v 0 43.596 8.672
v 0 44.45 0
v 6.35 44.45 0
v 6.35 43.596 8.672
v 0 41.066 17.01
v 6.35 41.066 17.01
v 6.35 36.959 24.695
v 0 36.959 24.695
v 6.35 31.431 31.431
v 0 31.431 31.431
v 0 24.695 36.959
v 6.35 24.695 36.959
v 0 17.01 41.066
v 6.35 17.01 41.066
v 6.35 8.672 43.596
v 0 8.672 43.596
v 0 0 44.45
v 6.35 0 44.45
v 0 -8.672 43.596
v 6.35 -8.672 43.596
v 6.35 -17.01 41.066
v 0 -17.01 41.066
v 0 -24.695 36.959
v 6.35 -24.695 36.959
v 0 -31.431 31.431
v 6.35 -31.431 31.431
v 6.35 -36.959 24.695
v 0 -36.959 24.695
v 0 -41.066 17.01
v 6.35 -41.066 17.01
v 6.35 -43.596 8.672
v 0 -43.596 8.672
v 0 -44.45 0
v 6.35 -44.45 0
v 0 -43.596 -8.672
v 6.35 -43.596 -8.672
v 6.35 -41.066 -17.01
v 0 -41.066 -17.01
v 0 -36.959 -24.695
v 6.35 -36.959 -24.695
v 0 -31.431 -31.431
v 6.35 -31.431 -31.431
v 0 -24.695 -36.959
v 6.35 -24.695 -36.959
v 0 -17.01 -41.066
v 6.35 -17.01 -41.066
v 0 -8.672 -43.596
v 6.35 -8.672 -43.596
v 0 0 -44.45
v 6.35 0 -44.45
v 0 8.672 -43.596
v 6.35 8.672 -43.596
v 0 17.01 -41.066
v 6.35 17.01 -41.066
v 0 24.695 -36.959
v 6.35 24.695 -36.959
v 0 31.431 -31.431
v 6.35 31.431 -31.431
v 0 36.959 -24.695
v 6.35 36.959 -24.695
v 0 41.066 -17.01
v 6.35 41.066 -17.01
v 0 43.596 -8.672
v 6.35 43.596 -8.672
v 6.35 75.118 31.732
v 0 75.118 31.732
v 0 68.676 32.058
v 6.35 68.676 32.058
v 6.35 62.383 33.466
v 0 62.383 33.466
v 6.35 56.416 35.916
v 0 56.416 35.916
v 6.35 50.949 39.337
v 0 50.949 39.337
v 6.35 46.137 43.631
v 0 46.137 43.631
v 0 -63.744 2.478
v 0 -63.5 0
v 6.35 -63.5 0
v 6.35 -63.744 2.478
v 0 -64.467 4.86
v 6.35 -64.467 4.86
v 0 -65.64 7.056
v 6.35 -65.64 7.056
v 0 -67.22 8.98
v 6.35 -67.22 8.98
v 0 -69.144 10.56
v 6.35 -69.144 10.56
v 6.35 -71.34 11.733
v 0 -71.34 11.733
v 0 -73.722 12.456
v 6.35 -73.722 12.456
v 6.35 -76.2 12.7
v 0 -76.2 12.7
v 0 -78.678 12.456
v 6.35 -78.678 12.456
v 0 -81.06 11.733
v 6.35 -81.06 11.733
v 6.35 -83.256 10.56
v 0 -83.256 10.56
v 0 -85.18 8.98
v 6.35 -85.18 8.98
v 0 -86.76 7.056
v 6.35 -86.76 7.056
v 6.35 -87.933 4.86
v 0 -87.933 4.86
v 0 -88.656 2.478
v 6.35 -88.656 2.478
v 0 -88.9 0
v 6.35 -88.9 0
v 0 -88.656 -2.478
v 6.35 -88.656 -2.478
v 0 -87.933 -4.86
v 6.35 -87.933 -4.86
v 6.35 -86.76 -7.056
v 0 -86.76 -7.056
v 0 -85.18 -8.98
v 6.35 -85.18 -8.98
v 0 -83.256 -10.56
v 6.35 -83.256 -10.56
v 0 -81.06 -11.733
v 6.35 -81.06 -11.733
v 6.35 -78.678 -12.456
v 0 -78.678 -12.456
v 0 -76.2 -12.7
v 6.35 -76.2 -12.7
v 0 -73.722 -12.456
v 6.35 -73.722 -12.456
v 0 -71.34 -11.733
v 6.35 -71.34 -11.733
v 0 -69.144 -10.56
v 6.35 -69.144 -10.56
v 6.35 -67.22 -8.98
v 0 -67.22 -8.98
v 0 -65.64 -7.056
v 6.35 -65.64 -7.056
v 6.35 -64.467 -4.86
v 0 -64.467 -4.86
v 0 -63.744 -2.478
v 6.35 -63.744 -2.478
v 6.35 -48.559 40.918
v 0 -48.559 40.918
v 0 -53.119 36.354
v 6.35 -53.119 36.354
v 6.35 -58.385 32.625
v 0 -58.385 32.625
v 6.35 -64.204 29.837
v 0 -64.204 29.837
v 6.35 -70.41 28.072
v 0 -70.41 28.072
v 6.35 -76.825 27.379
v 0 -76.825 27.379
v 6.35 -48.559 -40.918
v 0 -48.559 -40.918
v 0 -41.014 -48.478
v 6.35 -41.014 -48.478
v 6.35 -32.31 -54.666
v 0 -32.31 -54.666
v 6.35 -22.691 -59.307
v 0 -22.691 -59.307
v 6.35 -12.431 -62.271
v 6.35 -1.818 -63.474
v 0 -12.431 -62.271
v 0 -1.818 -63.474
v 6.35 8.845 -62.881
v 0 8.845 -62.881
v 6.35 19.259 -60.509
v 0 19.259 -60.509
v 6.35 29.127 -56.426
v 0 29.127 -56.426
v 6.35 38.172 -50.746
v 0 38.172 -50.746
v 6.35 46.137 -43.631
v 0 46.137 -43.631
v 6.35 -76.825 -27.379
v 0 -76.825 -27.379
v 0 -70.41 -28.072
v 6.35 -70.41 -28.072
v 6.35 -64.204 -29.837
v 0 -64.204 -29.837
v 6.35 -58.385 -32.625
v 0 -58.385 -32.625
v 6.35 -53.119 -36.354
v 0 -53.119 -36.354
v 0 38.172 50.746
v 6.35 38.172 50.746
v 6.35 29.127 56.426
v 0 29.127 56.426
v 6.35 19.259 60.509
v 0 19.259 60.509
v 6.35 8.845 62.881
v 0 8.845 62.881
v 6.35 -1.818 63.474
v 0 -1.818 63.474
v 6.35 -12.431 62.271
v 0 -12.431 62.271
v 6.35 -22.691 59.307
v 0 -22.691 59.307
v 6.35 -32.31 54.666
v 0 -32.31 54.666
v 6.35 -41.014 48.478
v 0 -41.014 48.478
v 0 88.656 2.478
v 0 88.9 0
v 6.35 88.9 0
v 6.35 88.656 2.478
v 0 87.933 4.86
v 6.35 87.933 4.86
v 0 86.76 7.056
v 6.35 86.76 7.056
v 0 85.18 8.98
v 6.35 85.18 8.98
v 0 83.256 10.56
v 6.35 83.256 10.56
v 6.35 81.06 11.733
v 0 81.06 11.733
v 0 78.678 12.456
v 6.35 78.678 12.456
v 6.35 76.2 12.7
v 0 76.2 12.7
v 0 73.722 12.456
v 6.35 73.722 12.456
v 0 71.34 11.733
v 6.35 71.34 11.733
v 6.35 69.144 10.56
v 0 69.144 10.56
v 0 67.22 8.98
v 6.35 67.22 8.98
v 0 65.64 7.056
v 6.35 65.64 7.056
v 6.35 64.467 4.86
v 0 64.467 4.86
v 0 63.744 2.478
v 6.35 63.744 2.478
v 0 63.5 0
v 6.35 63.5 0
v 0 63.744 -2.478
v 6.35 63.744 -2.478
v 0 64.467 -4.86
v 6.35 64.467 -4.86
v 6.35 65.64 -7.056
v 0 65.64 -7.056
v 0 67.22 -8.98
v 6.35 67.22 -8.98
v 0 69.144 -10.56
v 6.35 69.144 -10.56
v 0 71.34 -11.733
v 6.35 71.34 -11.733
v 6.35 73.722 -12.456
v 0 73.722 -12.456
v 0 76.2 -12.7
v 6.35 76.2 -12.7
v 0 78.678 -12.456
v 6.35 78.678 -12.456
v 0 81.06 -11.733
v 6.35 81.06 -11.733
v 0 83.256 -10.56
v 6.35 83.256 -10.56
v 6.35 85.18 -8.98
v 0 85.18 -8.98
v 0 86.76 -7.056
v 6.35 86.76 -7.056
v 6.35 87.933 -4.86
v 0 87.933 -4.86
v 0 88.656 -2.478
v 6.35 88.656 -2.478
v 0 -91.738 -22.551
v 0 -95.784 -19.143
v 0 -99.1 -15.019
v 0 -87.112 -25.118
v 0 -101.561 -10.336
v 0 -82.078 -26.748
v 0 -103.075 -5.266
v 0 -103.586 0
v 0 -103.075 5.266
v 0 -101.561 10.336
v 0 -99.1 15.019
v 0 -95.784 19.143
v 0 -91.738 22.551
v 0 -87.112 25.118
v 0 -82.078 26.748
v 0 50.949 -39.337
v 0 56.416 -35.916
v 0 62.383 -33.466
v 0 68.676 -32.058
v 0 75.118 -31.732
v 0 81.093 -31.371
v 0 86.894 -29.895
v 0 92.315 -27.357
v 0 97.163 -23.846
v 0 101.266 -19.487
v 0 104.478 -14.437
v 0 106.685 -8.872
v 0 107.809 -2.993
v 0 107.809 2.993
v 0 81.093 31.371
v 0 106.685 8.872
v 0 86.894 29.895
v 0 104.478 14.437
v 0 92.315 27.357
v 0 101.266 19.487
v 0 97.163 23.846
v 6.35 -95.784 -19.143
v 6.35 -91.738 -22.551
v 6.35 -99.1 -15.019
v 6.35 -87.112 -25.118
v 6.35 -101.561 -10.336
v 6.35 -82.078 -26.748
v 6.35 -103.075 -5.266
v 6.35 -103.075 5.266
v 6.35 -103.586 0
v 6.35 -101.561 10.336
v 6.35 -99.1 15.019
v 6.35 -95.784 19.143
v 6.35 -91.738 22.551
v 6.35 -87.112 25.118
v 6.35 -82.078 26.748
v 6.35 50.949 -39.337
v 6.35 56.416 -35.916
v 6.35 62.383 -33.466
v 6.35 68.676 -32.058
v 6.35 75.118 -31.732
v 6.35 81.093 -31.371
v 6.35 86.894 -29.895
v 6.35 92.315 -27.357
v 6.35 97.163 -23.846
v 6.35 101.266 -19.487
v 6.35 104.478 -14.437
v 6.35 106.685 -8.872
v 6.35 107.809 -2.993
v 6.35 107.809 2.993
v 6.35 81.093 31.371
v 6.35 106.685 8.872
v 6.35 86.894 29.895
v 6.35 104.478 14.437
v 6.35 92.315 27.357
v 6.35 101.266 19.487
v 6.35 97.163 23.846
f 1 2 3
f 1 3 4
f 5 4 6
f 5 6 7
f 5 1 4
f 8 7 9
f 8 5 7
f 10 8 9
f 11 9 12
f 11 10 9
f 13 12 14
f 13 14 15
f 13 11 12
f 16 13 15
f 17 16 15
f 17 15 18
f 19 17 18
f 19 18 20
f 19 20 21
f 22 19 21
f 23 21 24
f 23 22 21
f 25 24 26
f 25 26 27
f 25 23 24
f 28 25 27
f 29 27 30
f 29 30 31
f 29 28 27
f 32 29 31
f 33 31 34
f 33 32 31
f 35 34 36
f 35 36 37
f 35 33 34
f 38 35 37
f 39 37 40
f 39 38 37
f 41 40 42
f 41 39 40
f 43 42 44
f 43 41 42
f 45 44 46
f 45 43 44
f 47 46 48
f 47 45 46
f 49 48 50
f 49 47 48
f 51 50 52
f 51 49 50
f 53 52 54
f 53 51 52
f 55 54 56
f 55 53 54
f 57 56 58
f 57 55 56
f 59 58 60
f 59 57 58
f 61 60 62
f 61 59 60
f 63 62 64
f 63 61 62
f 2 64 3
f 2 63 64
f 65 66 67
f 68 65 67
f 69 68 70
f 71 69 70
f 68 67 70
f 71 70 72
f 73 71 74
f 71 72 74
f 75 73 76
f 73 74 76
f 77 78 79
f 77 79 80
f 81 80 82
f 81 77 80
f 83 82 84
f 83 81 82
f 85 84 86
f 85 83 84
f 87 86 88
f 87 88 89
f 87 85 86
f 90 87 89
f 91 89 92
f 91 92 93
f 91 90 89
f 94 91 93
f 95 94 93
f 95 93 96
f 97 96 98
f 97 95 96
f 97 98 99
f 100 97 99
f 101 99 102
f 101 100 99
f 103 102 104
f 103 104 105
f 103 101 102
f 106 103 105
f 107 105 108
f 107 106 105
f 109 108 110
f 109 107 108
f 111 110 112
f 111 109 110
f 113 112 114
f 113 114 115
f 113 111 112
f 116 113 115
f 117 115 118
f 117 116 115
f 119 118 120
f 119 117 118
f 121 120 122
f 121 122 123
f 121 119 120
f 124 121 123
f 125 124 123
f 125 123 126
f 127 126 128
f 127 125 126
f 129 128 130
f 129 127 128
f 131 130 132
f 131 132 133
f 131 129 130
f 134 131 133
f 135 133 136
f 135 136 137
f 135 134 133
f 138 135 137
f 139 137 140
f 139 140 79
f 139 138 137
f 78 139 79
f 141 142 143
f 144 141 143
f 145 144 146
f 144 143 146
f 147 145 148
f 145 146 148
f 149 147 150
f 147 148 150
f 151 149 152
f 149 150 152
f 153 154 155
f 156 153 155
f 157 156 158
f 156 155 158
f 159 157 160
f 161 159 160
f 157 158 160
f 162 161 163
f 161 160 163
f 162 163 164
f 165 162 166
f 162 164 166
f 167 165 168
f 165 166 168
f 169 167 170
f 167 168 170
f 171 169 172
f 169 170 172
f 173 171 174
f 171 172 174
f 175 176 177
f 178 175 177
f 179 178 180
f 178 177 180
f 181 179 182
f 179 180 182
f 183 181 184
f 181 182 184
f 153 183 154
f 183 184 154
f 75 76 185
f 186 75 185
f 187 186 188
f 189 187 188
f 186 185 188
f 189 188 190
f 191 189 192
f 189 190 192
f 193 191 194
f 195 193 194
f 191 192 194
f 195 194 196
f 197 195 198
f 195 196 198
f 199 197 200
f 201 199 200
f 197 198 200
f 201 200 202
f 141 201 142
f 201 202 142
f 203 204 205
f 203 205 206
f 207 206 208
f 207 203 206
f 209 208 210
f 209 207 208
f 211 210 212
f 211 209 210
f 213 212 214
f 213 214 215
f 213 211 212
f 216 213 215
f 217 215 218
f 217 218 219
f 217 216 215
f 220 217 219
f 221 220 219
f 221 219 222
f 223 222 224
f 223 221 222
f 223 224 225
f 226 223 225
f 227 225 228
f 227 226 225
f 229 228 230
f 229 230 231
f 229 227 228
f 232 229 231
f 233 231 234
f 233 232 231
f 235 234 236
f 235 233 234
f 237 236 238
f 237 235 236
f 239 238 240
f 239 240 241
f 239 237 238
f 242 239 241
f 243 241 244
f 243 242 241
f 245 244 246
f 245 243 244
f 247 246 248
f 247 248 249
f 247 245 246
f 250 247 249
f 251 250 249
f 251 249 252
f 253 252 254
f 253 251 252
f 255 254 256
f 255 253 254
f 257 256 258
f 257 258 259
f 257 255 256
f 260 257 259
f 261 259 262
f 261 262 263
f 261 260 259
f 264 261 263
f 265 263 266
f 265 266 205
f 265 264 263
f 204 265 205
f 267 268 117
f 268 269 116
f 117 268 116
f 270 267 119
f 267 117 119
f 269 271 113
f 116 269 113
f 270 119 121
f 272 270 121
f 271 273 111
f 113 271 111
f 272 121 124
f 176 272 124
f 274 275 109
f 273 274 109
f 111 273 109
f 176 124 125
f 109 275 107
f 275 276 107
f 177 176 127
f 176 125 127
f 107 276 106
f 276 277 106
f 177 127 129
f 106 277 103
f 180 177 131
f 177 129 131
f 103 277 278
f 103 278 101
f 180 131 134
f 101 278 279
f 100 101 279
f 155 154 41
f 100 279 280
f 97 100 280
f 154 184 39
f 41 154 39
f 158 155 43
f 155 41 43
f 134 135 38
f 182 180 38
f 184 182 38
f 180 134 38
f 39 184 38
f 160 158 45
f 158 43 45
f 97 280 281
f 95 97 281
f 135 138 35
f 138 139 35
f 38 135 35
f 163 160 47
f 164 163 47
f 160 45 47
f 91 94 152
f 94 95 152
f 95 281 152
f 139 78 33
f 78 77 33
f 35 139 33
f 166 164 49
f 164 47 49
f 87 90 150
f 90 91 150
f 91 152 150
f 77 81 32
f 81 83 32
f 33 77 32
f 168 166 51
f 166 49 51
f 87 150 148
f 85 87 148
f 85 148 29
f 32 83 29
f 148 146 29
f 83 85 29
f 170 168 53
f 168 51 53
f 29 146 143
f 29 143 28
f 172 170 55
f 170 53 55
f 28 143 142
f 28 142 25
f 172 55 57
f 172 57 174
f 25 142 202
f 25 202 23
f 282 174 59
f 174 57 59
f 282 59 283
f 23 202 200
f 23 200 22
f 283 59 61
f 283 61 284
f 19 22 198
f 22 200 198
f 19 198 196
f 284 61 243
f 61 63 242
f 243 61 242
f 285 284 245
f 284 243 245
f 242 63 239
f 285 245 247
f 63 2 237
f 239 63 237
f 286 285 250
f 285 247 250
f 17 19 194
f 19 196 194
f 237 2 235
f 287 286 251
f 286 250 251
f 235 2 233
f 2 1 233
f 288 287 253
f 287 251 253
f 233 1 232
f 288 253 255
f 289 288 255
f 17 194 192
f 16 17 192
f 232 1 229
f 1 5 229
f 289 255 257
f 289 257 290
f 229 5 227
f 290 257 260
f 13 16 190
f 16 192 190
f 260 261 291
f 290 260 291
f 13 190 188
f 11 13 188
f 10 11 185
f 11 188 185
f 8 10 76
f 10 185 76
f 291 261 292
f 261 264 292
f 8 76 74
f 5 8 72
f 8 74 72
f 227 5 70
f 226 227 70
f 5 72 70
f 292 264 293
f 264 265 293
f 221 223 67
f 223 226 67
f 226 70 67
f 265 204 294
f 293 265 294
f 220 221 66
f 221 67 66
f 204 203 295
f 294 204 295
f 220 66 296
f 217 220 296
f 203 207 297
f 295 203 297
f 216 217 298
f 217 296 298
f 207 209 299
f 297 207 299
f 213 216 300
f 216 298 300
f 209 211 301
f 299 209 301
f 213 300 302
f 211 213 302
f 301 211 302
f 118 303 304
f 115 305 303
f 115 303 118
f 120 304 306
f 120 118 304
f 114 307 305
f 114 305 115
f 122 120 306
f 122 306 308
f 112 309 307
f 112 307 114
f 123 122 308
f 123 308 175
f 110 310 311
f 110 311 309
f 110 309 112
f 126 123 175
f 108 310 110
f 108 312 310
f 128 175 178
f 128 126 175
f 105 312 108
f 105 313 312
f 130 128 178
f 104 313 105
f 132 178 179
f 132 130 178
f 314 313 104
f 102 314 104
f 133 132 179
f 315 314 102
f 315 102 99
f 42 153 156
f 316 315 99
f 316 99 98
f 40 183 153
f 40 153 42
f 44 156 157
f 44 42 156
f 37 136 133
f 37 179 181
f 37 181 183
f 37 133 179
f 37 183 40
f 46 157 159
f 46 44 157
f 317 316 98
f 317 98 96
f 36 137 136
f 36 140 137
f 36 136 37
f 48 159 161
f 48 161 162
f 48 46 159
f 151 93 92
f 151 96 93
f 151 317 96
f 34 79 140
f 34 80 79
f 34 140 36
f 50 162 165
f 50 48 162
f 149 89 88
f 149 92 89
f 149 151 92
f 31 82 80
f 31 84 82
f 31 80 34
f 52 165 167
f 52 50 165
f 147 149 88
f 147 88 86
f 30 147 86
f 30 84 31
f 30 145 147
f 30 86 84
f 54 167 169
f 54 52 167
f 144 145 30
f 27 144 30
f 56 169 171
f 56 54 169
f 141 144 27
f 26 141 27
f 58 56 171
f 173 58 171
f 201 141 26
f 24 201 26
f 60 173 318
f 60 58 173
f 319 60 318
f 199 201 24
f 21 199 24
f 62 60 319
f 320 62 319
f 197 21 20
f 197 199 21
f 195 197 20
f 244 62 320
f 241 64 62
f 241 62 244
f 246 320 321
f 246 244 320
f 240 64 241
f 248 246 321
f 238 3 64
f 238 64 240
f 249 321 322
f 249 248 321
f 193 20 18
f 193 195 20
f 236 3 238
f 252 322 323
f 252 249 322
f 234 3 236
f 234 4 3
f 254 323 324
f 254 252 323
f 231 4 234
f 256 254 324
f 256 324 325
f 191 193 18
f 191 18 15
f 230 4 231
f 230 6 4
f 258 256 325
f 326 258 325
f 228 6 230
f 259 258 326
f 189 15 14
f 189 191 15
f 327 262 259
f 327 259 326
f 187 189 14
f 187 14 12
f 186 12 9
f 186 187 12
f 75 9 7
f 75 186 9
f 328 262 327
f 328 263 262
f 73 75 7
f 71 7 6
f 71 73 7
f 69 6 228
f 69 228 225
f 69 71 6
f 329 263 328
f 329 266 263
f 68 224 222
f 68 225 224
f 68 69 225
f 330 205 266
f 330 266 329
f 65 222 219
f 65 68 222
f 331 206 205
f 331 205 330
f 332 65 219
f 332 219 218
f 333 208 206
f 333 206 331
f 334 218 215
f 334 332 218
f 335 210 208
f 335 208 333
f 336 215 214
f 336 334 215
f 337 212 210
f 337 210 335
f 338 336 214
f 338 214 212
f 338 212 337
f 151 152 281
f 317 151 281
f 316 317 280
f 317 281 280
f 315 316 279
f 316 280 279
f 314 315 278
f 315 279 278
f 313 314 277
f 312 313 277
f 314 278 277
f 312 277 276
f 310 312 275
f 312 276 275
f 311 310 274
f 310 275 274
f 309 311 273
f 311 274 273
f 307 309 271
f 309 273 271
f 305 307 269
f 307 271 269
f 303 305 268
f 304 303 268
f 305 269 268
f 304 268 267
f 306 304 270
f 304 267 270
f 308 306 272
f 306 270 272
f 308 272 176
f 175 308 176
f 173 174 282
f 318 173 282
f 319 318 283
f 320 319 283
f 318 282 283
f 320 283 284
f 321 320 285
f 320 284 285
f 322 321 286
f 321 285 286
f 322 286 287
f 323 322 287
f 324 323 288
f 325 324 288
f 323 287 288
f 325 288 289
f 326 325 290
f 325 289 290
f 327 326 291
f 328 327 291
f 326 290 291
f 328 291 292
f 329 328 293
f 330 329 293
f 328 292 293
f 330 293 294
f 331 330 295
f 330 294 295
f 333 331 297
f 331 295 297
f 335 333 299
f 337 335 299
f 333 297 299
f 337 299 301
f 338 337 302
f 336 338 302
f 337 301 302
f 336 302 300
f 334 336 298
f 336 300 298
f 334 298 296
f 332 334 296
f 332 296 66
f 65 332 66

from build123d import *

# Parameters (mm, degrees)
F0_R     = 12.7
F0_R_2   = 44.45
F1_DEPTH = 6.35


with BuildPart() as f1:
    # F0 (on Right) → F1 (new body)
    with BuildSketch(Plane.YZ):
        with BuildLine():
            ThreePointArc((-76.824834, -27.378873), (-61.23519, -31.10744), (-48.558824, -40.918097))
            ThreePointArc((-48.558824, -40.918097), (-1.818361, -63.47396), (46.136719, -43.630874))
            ThreePointArc((46.136719, -43.630874), (59.347524, -34.564632), (75.117614, -31.731545))
            ThreePointArc((75.117614, -31.731545), (107.95, 0), (75.117614, 31.731545))
            ThreePointArc((75.117614, 31.731545), (59.347524, 34.564632), (46.136719, 43.630874))
            ThreePointArc((46.136719, 43.630874), (-1.818361, 63.47396), (-48.558824, 40.918097))
            ThreePointArc((-48.558824, 40.918097), (-61.23519, 31.10744), (-76.824834, 27.378873))
            ThreePointArc((-76.824834, 27.378873), (-103.586002, 0), (-76.824834, -27.378873))
        make_face()
        with Locations((-76.2, 0)):
            Circle(F0_R, mode=Mode.SUBTRACT)
        Circle(F0_R_2, mode=Mode.SUBTRACT)
        with Locations((76.2, 0)):
            Circle(F0_R, mode=Mode.SUBTRACT)
    extrude(amount=F1_DEPTH)


solid = f1.part
